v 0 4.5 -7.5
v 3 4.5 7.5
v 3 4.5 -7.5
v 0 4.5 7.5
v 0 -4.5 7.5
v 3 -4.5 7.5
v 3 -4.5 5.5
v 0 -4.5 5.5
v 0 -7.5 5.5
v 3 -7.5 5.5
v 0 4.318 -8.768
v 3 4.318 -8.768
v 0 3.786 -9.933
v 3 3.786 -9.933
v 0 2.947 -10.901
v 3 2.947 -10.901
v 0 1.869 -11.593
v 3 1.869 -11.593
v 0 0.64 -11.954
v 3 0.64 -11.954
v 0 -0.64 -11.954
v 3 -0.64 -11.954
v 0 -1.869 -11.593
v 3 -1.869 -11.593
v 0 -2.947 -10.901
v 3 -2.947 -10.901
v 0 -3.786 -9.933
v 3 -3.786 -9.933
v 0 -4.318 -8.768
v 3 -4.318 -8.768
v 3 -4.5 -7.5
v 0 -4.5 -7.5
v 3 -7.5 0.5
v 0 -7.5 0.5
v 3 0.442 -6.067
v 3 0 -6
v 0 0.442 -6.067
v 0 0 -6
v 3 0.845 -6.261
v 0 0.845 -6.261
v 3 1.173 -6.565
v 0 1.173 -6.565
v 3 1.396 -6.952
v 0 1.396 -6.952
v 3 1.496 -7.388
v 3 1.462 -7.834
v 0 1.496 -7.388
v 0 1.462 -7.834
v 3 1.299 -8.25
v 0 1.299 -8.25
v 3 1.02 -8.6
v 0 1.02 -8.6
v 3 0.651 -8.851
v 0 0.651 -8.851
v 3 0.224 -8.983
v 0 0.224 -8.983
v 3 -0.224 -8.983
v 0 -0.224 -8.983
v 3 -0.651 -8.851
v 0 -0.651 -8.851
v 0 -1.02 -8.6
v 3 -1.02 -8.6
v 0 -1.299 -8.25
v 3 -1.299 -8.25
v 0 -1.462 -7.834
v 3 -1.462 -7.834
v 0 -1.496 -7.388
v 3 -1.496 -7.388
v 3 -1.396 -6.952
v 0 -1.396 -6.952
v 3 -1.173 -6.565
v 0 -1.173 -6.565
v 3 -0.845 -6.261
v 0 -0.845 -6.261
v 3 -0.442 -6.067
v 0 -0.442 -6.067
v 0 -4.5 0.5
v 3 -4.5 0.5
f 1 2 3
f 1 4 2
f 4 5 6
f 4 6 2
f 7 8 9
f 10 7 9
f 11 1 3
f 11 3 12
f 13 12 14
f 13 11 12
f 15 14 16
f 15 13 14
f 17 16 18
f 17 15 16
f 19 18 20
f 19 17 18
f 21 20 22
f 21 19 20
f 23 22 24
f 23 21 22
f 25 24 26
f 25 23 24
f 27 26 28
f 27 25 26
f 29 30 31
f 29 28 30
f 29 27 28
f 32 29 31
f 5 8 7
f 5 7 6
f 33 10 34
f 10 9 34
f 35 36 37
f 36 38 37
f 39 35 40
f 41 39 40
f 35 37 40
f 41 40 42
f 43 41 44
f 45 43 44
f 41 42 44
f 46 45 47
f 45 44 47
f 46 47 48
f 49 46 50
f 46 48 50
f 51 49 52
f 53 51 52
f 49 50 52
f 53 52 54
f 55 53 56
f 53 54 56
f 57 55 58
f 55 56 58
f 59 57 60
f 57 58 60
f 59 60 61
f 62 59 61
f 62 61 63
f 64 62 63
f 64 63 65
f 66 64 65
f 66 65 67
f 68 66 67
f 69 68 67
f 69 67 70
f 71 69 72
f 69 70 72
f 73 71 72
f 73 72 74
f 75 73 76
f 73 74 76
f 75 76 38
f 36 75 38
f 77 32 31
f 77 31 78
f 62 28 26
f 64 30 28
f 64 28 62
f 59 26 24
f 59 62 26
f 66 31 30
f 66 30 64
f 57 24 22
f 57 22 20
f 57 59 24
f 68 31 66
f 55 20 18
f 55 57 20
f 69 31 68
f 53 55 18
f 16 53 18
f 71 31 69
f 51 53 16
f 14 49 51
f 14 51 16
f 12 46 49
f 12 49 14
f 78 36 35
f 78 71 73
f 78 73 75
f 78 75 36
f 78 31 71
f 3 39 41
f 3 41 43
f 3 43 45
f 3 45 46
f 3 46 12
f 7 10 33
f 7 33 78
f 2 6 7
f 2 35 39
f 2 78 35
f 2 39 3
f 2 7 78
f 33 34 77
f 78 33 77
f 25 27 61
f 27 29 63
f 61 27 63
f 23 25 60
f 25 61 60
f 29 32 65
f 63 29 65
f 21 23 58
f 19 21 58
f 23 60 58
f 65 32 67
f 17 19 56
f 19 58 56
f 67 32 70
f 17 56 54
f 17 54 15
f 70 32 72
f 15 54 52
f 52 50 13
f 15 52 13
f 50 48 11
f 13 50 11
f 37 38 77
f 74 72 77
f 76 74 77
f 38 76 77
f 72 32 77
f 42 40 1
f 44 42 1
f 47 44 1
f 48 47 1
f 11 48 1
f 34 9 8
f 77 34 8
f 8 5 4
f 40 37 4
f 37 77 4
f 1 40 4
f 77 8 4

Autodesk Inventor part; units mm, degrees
ref_plane "YZ Plane" through (0, 0, 0) normal (1, 0, 0) x (0, 1, 0)
ref_plane "XZ Plane" through (0, 0, 0) normal (0, 1, 0) x (-1, 0, 0)
ref_plane "XY Plane" through (0, 0, 0) normal (0, 0, 1) x (1, 0, 0)
sketch "Sketch1" plane through (0, 0, 0) normal (1, 0, 0) x (0, 1, 0)
  line L0 (-4.5, 7.5) -> (4.5, 7.5)
  line L1 (4.5, 7.5) -> (4.5, -7.5)
  line L2 (4.5, -7.5) -> (-4.5, -7.5)
  line L3 (-4.5, -7.5) -> (-4.5, 7.5)
  line L4 (-4.5, 7.5) -> (4.5, -7.5) construction
  line L5 (4.5, 7.5) -> (-4.5, -7.5) construction
  circle A0 centre (0, -7.5) radius 4.5
  point P0 (0, 0)
  dimension "d0" = 9
  dimension "d1" = 15
  dimension "d2" = 9
extrude "Extrusion1" add sketch "Sketch1" along normal blind 3
sketch "Sketch2" plane through (0, 0, 0) normal (-1, 0, 0) x (0, 0, 1)
  arc A0 (-7.5, 4.5) -> (-7.5, -4.5) centre (-7.5, 0) ccw projected
  circle A1 centre (-7.5, 0) radius 1.5
  point P0 (0, 0)
  dimension "d5" = 3
extrude "Extrusion2" cut sketch "Sketch2" against normal blind 10
sketch "Sketch3" plane through (0, 0, 0) normal (-1, 0, 0) x (0, 0, 1)
  line L0 (7.5, -4.5) -> (-7.5, -4.5) projected
  line L1 (0.5, -4.5) -> (5.5, -4.5)
  line L2 (5.5, -4.5) -> (5.5, -7.5)
  line L3 (5.5, -7.5) -> (0.5, -7.5)
  line L4 (0.5, -7.5) -> (0.5, -4.5)
  circle A0 centre (-7.5, 0) radius 1.5 projected
  point P0 (0, 0)
  dimension "d8" = 5
  dimension "d9" = 3
  dimension "d10" = 8
extrude "Extrusion3" add sketch "Sketch3" against normal blind 3 contours L2 L3 L4 L0
properties part number "Battey latch"
